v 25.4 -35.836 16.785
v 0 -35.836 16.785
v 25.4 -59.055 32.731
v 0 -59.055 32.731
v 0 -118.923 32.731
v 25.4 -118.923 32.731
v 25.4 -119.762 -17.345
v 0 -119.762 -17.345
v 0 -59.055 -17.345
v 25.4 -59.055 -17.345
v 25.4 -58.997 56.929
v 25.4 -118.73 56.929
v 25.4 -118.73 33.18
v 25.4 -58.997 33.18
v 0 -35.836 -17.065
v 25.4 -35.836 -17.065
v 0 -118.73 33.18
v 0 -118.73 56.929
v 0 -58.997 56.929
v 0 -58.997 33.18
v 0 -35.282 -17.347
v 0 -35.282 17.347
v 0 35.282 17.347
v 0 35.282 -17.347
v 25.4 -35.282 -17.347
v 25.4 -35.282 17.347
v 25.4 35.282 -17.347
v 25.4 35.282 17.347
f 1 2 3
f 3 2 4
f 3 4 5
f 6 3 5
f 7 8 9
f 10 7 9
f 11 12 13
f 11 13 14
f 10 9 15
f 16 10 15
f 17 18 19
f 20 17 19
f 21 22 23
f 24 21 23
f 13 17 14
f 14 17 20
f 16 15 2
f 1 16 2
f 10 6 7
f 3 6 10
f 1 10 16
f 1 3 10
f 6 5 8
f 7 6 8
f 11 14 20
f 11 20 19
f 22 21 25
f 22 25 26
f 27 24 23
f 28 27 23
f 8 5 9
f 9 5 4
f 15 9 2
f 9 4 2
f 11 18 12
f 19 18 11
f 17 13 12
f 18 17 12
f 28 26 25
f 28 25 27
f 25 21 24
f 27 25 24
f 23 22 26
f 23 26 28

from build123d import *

# Parameters (mm, degrees)
F1_W     = 59.733614
F1_H     = 23.749508
F0_W     = 70.563414
F0_H     = 34.69342
F2_DEPTH = 25.4


with BuildPart() as f2:
    # F1 (on face) + F0 (on Right) → F2 (new body)
    with BuildSketch(Plane.YZ):
        with Locations((-88.863447, 45.054469)):
            Rectangle(F1_W, F1_H)
        Polygon((-89.197626, 7.86755), (-59.055462, 32.731365), (-118.923075, 32.731365), align=None)
        Polygon((-119.762346, -17.344825), (-89.197626, 7.86755), (-118.923075, 32.731365), align=None)
        Polygon((-119.762346, -17.344825), (-59.055462, -17.344825), (-89.197626, 7.86755), align=None)
        Polygon((-59.055462, -17.344825), (-59.055462, 32.731365), (-89.197626, 7.86755), align=None)
        Polygon((-35.835776, 16.785316), (-59.055462, 32.731365), (-59.055462, -17.344825), align=None)
        Polygon((-35.835776, 16.785316), (-59.055462, -17.344825), (-35.835776, -17.065071), align=None)
    with BuildSketch(Plane.YZ):
        Rectangle(F0_W, F0_H)
    extrude(amount=F2_DEPTH)


solid = f2.part
